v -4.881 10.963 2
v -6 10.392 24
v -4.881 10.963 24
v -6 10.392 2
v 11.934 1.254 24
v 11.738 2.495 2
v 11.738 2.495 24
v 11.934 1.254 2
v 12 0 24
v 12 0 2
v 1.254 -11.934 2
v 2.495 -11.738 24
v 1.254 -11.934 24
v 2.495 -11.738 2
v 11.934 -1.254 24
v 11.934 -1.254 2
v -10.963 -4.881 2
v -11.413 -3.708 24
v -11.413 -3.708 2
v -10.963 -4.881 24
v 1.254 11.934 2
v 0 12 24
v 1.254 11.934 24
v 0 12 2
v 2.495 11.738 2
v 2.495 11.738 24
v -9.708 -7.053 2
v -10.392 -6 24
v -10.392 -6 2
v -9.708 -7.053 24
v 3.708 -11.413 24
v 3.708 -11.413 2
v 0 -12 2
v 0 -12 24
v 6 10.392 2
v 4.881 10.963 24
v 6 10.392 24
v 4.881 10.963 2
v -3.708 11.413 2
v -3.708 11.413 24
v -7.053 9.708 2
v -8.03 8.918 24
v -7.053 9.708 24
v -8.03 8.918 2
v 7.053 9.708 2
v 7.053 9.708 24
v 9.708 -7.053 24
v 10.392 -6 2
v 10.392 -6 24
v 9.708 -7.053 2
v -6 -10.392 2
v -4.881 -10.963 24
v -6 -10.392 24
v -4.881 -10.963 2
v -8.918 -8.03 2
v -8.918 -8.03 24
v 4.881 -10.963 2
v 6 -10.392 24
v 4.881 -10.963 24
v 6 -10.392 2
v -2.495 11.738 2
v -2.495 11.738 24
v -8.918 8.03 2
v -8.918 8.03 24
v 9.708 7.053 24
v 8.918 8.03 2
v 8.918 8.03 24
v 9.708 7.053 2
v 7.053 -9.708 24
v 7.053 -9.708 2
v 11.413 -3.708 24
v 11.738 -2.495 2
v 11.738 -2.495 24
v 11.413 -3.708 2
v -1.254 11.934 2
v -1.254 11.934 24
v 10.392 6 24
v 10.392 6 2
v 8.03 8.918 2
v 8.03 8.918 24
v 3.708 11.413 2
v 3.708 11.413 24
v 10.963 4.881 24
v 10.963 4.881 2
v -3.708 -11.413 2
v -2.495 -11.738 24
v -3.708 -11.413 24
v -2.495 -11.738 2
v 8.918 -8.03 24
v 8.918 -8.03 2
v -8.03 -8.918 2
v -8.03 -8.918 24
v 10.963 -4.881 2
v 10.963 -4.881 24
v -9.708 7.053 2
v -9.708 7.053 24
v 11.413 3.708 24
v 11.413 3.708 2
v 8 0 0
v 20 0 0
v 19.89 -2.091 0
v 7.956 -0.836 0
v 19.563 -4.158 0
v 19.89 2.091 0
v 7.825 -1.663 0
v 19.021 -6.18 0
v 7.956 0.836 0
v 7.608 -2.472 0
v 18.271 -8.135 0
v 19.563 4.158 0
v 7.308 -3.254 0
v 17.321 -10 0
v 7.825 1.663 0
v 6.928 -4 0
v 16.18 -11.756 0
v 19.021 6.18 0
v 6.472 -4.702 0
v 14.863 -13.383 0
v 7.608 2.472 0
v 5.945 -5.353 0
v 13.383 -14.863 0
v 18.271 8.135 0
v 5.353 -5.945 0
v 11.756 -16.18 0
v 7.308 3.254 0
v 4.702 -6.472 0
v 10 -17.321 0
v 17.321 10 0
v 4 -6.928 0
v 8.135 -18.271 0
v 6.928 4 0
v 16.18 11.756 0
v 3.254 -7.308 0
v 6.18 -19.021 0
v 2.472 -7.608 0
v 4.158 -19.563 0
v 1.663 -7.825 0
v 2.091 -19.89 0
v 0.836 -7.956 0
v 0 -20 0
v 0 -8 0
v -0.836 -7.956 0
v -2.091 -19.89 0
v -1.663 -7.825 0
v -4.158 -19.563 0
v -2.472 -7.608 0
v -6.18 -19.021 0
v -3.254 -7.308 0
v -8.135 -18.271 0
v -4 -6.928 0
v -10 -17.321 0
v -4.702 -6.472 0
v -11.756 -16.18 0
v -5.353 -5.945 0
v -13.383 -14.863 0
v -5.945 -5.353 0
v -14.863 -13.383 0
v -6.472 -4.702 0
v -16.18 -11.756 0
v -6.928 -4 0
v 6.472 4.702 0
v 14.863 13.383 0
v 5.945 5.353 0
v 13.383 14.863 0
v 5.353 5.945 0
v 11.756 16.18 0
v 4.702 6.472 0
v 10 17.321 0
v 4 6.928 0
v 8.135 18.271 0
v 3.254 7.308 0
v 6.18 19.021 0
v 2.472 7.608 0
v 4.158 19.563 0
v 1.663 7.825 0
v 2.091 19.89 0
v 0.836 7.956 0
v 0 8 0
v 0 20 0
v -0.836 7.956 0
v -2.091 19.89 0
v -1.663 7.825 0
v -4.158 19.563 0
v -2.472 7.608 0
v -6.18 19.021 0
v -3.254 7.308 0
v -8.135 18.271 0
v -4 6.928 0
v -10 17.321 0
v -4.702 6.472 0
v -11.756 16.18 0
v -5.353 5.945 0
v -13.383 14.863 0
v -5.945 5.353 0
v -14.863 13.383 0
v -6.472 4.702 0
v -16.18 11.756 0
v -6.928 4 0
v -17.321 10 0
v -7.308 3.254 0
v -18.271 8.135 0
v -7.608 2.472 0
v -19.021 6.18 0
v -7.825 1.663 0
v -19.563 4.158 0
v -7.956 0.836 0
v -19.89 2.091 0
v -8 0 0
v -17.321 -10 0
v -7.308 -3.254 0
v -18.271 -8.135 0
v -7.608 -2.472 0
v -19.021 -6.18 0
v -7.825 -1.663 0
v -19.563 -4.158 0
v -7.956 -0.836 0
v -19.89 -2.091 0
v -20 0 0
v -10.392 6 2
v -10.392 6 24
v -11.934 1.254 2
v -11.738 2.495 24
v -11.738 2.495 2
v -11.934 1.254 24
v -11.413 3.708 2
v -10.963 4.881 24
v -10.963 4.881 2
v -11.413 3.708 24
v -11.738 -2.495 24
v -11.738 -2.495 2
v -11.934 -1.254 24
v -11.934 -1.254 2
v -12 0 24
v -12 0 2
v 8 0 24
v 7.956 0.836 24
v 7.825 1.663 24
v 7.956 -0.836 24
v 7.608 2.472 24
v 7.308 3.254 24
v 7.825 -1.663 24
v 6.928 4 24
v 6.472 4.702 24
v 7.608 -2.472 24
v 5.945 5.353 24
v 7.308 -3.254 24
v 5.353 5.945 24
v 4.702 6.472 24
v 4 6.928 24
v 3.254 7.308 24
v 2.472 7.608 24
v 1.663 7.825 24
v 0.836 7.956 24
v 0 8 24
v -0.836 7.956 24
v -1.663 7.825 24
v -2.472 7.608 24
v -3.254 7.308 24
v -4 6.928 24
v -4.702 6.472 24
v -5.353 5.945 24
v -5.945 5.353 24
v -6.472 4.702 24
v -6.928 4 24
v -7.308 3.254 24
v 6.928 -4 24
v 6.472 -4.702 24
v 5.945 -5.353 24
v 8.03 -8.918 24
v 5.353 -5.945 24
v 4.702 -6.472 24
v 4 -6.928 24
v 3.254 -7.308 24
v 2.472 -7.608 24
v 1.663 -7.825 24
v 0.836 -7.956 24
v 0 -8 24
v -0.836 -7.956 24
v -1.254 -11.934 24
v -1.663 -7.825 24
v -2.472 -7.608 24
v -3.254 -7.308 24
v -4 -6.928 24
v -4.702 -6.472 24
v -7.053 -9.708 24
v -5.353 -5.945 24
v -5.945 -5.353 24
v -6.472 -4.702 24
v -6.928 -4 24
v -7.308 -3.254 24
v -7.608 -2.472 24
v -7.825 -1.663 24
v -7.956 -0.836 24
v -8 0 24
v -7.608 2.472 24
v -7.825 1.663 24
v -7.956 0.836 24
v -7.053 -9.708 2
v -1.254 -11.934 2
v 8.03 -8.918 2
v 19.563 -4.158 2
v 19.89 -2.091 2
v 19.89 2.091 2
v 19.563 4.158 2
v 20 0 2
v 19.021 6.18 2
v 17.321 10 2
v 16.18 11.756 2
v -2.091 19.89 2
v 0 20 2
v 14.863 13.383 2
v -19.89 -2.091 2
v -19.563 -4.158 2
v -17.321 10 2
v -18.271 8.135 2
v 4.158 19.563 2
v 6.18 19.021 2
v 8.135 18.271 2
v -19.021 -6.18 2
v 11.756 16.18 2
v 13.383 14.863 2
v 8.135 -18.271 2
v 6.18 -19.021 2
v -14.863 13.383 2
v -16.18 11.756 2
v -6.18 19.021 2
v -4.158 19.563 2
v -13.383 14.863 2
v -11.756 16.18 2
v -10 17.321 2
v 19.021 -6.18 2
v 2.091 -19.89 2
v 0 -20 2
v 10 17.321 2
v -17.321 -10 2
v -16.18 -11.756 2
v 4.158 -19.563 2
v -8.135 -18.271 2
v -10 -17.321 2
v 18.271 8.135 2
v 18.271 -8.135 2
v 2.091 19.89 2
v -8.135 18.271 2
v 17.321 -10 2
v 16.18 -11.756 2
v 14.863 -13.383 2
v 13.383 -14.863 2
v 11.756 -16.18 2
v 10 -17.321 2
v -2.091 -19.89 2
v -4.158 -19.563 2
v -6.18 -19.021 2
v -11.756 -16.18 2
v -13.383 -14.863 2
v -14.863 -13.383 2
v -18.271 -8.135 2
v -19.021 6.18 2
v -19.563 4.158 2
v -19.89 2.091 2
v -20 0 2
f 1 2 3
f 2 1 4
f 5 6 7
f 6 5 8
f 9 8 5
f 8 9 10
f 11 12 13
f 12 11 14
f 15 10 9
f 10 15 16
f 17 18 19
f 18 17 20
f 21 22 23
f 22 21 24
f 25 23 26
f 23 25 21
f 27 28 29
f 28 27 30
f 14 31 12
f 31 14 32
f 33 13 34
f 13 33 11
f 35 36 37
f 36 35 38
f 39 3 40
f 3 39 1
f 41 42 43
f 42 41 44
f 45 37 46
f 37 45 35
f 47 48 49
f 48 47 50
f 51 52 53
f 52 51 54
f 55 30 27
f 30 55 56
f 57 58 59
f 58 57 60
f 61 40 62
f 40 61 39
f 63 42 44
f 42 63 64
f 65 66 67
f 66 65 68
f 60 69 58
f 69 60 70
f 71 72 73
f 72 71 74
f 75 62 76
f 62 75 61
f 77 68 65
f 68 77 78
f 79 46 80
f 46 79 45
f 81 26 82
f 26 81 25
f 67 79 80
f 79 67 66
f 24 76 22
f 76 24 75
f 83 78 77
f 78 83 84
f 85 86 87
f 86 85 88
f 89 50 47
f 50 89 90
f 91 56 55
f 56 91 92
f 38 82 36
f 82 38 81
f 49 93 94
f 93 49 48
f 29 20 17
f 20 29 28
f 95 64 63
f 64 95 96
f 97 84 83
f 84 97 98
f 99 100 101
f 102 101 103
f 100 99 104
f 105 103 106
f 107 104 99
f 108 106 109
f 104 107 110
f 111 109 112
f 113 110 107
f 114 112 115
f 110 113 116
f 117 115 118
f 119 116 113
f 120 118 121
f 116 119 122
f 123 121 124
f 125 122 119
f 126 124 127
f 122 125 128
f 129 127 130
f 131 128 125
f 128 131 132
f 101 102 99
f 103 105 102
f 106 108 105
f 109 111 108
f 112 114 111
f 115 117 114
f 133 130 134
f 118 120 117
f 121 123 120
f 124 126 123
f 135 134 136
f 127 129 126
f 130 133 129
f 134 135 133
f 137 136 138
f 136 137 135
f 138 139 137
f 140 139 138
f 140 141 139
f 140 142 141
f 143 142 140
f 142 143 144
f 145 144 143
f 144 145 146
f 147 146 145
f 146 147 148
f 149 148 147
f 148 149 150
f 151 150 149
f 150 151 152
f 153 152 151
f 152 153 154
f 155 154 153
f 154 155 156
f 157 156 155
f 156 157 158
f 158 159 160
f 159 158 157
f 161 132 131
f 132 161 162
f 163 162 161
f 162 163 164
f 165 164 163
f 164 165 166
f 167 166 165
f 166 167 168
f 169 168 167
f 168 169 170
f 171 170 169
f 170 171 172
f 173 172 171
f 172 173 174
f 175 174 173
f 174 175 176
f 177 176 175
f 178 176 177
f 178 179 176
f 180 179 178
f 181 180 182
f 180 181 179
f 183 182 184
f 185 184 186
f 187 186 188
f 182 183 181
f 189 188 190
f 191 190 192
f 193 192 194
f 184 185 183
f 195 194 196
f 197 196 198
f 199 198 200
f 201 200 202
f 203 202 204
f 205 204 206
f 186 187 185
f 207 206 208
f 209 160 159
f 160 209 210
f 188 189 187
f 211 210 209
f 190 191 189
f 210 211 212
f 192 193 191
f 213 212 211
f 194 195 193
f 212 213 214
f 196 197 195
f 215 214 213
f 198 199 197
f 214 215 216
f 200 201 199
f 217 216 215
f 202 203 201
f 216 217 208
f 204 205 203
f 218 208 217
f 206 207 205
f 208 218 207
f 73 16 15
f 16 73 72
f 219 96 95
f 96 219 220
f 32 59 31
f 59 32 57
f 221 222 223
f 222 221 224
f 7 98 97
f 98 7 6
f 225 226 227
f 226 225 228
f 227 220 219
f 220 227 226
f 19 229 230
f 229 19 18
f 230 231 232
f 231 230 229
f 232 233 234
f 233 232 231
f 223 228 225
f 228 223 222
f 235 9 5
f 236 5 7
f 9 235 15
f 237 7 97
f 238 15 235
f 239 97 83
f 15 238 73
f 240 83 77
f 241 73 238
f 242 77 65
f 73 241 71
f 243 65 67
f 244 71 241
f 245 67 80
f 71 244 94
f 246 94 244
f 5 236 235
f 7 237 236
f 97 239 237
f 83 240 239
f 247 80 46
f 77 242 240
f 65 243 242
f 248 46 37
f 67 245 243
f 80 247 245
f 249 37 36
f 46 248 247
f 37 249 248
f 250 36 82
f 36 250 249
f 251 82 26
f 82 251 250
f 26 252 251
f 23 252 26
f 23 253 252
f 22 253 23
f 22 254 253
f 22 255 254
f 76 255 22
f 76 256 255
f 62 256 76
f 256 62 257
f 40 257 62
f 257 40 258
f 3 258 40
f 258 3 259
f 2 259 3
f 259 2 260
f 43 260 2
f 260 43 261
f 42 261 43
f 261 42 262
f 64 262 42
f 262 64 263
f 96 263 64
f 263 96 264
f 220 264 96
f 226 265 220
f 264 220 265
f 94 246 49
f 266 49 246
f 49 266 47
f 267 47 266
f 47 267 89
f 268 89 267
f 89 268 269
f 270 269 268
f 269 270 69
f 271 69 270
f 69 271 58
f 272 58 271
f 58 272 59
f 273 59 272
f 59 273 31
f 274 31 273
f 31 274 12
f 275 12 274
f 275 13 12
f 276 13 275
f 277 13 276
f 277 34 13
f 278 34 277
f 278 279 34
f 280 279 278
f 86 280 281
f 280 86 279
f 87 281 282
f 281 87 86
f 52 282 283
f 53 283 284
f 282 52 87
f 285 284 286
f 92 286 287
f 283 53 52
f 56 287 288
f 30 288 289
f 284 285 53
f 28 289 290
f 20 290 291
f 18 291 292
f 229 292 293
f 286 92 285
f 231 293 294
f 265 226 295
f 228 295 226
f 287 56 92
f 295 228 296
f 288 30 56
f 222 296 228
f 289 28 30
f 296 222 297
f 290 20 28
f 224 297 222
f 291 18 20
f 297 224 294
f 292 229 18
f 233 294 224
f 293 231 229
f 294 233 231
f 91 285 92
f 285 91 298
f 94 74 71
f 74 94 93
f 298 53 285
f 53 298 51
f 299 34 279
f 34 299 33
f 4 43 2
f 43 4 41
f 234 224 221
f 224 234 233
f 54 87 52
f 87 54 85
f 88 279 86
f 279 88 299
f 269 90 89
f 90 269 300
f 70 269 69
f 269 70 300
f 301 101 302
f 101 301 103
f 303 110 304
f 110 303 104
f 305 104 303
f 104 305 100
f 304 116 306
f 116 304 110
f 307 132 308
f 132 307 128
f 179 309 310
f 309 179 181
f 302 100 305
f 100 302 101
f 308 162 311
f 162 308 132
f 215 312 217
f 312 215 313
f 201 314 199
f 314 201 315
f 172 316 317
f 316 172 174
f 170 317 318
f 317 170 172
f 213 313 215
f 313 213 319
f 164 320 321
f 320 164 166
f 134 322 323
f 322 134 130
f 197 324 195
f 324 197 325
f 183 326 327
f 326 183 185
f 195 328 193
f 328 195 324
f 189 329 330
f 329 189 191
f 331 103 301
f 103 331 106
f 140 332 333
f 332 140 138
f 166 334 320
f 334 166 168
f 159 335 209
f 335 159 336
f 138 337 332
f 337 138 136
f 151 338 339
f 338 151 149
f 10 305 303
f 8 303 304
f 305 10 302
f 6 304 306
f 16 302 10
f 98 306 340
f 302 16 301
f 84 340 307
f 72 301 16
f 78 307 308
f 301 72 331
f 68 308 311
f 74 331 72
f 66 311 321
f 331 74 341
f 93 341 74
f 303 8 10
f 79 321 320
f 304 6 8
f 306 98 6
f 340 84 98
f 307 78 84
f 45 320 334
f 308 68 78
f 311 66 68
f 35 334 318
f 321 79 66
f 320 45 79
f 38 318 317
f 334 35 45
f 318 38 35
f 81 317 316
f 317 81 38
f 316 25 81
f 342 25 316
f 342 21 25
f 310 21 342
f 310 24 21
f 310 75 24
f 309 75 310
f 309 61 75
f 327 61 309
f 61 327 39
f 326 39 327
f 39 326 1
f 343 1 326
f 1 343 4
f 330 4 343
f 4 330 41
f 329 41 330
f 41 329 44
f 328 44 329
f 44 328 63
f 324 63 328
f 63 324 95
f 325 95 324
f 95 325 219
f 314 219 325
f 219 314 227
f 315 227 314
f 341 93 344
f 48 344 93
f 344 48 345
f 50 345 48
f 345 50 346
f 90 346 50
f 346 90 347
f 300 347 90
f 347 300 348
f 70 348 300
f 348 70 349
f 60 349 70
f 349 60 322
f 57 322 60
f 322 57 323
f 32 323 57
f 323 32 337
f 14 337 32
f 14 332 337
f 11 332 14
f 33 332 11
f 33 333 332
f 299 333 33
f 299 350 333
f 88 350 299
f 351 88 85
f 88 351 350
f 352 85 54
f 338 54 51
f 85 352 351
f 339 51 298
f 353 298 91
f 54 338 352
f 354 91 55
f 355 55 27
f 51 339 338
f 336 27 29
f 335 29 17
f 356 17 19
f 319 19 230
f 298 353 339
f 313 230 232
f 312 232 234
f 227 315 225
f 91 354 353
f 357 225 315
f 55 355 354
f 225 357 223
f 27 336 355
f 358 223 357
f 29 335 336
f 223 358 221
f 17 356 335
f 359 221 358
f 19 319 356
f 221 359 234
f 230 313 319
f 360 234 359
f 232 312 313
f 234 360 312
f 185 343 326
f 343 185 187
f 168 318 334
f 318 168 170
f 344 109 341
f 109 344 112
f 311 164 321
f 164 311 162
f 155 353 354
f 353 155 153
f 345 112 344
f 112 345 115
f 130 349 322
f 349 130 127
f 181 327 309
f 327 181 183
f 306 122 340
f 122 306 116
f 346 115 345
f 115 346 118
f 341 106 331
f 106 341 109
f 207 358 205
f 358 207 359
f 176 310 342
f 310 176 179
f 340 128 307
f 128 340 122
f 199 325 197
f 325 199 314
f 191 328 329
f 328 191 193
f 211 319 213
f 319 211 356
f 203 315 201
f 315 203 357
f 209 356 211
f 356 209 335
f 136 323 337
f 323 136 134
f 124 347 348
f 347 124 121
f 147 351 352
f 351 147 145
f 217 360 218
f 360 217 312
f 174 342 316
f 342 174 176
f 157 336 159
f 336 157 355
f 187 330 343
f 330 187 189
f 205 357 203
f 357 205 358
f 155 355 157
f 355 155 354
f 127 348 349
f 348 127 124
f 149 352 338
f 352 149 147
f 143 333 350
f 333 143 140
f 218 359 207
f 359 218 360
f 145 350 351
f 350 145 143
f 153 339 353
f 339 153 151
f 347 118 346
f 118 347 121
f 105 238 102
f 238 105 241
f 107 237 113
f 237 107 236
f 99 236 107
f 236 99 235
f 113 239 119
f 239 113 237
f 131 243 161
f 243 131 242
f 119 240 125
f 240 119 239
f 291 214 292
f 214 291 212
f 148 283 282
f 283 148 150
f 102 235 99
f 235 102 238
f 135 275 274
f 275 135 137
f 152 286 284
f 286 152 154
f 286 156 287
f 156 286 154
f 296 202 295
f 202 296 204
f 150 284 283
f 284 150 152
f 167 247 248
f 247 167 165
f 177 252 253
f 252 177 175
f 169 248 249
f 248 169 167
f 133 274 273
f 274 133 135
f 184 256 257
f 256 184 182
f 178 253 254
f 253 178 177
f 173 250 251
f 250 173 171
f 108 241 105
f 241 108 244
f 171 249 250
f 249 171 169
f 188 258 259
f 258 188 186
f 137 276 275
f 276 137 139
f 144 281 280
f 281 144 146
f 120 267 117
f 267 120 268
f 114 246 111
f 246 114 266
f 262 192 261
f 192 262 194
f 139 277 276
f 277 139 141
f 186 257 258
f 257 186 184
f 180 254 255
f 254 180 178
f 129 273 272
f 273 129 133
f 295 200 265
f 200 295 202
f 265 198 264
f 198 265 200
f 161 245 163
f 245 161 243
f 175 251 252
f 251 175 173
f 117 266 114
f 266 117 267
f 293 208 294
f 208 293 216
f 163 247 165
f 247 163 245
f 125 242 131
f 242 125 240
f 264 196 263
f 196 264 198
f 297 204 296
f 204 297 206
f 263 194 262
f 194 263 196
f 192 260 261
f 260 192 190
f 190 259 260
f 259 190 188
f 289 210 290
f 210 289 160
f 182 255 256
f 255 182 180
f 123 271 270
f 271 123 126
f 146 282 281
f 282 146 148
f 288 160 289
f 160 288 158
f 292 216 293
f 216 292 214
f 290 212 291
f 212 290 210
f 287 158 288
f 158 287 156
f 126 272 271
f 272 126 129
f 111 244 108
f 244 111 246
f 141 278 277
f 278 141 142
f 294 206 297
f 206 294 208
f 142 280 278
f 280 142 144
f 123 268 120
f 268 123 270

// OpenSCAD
// Flanged spacer.
$fn = 60;
eps = 0.02;
inner_d = 16;
outer_d = 24;
length = 24;
flange_d = 40;
difference() { union() { cylinder(d=outer_d,h=length); cylinder(d=flange_d,h=2); } translate([0,0,-eps]) cylinder(d=inner_d,h=length+2*eps); }
